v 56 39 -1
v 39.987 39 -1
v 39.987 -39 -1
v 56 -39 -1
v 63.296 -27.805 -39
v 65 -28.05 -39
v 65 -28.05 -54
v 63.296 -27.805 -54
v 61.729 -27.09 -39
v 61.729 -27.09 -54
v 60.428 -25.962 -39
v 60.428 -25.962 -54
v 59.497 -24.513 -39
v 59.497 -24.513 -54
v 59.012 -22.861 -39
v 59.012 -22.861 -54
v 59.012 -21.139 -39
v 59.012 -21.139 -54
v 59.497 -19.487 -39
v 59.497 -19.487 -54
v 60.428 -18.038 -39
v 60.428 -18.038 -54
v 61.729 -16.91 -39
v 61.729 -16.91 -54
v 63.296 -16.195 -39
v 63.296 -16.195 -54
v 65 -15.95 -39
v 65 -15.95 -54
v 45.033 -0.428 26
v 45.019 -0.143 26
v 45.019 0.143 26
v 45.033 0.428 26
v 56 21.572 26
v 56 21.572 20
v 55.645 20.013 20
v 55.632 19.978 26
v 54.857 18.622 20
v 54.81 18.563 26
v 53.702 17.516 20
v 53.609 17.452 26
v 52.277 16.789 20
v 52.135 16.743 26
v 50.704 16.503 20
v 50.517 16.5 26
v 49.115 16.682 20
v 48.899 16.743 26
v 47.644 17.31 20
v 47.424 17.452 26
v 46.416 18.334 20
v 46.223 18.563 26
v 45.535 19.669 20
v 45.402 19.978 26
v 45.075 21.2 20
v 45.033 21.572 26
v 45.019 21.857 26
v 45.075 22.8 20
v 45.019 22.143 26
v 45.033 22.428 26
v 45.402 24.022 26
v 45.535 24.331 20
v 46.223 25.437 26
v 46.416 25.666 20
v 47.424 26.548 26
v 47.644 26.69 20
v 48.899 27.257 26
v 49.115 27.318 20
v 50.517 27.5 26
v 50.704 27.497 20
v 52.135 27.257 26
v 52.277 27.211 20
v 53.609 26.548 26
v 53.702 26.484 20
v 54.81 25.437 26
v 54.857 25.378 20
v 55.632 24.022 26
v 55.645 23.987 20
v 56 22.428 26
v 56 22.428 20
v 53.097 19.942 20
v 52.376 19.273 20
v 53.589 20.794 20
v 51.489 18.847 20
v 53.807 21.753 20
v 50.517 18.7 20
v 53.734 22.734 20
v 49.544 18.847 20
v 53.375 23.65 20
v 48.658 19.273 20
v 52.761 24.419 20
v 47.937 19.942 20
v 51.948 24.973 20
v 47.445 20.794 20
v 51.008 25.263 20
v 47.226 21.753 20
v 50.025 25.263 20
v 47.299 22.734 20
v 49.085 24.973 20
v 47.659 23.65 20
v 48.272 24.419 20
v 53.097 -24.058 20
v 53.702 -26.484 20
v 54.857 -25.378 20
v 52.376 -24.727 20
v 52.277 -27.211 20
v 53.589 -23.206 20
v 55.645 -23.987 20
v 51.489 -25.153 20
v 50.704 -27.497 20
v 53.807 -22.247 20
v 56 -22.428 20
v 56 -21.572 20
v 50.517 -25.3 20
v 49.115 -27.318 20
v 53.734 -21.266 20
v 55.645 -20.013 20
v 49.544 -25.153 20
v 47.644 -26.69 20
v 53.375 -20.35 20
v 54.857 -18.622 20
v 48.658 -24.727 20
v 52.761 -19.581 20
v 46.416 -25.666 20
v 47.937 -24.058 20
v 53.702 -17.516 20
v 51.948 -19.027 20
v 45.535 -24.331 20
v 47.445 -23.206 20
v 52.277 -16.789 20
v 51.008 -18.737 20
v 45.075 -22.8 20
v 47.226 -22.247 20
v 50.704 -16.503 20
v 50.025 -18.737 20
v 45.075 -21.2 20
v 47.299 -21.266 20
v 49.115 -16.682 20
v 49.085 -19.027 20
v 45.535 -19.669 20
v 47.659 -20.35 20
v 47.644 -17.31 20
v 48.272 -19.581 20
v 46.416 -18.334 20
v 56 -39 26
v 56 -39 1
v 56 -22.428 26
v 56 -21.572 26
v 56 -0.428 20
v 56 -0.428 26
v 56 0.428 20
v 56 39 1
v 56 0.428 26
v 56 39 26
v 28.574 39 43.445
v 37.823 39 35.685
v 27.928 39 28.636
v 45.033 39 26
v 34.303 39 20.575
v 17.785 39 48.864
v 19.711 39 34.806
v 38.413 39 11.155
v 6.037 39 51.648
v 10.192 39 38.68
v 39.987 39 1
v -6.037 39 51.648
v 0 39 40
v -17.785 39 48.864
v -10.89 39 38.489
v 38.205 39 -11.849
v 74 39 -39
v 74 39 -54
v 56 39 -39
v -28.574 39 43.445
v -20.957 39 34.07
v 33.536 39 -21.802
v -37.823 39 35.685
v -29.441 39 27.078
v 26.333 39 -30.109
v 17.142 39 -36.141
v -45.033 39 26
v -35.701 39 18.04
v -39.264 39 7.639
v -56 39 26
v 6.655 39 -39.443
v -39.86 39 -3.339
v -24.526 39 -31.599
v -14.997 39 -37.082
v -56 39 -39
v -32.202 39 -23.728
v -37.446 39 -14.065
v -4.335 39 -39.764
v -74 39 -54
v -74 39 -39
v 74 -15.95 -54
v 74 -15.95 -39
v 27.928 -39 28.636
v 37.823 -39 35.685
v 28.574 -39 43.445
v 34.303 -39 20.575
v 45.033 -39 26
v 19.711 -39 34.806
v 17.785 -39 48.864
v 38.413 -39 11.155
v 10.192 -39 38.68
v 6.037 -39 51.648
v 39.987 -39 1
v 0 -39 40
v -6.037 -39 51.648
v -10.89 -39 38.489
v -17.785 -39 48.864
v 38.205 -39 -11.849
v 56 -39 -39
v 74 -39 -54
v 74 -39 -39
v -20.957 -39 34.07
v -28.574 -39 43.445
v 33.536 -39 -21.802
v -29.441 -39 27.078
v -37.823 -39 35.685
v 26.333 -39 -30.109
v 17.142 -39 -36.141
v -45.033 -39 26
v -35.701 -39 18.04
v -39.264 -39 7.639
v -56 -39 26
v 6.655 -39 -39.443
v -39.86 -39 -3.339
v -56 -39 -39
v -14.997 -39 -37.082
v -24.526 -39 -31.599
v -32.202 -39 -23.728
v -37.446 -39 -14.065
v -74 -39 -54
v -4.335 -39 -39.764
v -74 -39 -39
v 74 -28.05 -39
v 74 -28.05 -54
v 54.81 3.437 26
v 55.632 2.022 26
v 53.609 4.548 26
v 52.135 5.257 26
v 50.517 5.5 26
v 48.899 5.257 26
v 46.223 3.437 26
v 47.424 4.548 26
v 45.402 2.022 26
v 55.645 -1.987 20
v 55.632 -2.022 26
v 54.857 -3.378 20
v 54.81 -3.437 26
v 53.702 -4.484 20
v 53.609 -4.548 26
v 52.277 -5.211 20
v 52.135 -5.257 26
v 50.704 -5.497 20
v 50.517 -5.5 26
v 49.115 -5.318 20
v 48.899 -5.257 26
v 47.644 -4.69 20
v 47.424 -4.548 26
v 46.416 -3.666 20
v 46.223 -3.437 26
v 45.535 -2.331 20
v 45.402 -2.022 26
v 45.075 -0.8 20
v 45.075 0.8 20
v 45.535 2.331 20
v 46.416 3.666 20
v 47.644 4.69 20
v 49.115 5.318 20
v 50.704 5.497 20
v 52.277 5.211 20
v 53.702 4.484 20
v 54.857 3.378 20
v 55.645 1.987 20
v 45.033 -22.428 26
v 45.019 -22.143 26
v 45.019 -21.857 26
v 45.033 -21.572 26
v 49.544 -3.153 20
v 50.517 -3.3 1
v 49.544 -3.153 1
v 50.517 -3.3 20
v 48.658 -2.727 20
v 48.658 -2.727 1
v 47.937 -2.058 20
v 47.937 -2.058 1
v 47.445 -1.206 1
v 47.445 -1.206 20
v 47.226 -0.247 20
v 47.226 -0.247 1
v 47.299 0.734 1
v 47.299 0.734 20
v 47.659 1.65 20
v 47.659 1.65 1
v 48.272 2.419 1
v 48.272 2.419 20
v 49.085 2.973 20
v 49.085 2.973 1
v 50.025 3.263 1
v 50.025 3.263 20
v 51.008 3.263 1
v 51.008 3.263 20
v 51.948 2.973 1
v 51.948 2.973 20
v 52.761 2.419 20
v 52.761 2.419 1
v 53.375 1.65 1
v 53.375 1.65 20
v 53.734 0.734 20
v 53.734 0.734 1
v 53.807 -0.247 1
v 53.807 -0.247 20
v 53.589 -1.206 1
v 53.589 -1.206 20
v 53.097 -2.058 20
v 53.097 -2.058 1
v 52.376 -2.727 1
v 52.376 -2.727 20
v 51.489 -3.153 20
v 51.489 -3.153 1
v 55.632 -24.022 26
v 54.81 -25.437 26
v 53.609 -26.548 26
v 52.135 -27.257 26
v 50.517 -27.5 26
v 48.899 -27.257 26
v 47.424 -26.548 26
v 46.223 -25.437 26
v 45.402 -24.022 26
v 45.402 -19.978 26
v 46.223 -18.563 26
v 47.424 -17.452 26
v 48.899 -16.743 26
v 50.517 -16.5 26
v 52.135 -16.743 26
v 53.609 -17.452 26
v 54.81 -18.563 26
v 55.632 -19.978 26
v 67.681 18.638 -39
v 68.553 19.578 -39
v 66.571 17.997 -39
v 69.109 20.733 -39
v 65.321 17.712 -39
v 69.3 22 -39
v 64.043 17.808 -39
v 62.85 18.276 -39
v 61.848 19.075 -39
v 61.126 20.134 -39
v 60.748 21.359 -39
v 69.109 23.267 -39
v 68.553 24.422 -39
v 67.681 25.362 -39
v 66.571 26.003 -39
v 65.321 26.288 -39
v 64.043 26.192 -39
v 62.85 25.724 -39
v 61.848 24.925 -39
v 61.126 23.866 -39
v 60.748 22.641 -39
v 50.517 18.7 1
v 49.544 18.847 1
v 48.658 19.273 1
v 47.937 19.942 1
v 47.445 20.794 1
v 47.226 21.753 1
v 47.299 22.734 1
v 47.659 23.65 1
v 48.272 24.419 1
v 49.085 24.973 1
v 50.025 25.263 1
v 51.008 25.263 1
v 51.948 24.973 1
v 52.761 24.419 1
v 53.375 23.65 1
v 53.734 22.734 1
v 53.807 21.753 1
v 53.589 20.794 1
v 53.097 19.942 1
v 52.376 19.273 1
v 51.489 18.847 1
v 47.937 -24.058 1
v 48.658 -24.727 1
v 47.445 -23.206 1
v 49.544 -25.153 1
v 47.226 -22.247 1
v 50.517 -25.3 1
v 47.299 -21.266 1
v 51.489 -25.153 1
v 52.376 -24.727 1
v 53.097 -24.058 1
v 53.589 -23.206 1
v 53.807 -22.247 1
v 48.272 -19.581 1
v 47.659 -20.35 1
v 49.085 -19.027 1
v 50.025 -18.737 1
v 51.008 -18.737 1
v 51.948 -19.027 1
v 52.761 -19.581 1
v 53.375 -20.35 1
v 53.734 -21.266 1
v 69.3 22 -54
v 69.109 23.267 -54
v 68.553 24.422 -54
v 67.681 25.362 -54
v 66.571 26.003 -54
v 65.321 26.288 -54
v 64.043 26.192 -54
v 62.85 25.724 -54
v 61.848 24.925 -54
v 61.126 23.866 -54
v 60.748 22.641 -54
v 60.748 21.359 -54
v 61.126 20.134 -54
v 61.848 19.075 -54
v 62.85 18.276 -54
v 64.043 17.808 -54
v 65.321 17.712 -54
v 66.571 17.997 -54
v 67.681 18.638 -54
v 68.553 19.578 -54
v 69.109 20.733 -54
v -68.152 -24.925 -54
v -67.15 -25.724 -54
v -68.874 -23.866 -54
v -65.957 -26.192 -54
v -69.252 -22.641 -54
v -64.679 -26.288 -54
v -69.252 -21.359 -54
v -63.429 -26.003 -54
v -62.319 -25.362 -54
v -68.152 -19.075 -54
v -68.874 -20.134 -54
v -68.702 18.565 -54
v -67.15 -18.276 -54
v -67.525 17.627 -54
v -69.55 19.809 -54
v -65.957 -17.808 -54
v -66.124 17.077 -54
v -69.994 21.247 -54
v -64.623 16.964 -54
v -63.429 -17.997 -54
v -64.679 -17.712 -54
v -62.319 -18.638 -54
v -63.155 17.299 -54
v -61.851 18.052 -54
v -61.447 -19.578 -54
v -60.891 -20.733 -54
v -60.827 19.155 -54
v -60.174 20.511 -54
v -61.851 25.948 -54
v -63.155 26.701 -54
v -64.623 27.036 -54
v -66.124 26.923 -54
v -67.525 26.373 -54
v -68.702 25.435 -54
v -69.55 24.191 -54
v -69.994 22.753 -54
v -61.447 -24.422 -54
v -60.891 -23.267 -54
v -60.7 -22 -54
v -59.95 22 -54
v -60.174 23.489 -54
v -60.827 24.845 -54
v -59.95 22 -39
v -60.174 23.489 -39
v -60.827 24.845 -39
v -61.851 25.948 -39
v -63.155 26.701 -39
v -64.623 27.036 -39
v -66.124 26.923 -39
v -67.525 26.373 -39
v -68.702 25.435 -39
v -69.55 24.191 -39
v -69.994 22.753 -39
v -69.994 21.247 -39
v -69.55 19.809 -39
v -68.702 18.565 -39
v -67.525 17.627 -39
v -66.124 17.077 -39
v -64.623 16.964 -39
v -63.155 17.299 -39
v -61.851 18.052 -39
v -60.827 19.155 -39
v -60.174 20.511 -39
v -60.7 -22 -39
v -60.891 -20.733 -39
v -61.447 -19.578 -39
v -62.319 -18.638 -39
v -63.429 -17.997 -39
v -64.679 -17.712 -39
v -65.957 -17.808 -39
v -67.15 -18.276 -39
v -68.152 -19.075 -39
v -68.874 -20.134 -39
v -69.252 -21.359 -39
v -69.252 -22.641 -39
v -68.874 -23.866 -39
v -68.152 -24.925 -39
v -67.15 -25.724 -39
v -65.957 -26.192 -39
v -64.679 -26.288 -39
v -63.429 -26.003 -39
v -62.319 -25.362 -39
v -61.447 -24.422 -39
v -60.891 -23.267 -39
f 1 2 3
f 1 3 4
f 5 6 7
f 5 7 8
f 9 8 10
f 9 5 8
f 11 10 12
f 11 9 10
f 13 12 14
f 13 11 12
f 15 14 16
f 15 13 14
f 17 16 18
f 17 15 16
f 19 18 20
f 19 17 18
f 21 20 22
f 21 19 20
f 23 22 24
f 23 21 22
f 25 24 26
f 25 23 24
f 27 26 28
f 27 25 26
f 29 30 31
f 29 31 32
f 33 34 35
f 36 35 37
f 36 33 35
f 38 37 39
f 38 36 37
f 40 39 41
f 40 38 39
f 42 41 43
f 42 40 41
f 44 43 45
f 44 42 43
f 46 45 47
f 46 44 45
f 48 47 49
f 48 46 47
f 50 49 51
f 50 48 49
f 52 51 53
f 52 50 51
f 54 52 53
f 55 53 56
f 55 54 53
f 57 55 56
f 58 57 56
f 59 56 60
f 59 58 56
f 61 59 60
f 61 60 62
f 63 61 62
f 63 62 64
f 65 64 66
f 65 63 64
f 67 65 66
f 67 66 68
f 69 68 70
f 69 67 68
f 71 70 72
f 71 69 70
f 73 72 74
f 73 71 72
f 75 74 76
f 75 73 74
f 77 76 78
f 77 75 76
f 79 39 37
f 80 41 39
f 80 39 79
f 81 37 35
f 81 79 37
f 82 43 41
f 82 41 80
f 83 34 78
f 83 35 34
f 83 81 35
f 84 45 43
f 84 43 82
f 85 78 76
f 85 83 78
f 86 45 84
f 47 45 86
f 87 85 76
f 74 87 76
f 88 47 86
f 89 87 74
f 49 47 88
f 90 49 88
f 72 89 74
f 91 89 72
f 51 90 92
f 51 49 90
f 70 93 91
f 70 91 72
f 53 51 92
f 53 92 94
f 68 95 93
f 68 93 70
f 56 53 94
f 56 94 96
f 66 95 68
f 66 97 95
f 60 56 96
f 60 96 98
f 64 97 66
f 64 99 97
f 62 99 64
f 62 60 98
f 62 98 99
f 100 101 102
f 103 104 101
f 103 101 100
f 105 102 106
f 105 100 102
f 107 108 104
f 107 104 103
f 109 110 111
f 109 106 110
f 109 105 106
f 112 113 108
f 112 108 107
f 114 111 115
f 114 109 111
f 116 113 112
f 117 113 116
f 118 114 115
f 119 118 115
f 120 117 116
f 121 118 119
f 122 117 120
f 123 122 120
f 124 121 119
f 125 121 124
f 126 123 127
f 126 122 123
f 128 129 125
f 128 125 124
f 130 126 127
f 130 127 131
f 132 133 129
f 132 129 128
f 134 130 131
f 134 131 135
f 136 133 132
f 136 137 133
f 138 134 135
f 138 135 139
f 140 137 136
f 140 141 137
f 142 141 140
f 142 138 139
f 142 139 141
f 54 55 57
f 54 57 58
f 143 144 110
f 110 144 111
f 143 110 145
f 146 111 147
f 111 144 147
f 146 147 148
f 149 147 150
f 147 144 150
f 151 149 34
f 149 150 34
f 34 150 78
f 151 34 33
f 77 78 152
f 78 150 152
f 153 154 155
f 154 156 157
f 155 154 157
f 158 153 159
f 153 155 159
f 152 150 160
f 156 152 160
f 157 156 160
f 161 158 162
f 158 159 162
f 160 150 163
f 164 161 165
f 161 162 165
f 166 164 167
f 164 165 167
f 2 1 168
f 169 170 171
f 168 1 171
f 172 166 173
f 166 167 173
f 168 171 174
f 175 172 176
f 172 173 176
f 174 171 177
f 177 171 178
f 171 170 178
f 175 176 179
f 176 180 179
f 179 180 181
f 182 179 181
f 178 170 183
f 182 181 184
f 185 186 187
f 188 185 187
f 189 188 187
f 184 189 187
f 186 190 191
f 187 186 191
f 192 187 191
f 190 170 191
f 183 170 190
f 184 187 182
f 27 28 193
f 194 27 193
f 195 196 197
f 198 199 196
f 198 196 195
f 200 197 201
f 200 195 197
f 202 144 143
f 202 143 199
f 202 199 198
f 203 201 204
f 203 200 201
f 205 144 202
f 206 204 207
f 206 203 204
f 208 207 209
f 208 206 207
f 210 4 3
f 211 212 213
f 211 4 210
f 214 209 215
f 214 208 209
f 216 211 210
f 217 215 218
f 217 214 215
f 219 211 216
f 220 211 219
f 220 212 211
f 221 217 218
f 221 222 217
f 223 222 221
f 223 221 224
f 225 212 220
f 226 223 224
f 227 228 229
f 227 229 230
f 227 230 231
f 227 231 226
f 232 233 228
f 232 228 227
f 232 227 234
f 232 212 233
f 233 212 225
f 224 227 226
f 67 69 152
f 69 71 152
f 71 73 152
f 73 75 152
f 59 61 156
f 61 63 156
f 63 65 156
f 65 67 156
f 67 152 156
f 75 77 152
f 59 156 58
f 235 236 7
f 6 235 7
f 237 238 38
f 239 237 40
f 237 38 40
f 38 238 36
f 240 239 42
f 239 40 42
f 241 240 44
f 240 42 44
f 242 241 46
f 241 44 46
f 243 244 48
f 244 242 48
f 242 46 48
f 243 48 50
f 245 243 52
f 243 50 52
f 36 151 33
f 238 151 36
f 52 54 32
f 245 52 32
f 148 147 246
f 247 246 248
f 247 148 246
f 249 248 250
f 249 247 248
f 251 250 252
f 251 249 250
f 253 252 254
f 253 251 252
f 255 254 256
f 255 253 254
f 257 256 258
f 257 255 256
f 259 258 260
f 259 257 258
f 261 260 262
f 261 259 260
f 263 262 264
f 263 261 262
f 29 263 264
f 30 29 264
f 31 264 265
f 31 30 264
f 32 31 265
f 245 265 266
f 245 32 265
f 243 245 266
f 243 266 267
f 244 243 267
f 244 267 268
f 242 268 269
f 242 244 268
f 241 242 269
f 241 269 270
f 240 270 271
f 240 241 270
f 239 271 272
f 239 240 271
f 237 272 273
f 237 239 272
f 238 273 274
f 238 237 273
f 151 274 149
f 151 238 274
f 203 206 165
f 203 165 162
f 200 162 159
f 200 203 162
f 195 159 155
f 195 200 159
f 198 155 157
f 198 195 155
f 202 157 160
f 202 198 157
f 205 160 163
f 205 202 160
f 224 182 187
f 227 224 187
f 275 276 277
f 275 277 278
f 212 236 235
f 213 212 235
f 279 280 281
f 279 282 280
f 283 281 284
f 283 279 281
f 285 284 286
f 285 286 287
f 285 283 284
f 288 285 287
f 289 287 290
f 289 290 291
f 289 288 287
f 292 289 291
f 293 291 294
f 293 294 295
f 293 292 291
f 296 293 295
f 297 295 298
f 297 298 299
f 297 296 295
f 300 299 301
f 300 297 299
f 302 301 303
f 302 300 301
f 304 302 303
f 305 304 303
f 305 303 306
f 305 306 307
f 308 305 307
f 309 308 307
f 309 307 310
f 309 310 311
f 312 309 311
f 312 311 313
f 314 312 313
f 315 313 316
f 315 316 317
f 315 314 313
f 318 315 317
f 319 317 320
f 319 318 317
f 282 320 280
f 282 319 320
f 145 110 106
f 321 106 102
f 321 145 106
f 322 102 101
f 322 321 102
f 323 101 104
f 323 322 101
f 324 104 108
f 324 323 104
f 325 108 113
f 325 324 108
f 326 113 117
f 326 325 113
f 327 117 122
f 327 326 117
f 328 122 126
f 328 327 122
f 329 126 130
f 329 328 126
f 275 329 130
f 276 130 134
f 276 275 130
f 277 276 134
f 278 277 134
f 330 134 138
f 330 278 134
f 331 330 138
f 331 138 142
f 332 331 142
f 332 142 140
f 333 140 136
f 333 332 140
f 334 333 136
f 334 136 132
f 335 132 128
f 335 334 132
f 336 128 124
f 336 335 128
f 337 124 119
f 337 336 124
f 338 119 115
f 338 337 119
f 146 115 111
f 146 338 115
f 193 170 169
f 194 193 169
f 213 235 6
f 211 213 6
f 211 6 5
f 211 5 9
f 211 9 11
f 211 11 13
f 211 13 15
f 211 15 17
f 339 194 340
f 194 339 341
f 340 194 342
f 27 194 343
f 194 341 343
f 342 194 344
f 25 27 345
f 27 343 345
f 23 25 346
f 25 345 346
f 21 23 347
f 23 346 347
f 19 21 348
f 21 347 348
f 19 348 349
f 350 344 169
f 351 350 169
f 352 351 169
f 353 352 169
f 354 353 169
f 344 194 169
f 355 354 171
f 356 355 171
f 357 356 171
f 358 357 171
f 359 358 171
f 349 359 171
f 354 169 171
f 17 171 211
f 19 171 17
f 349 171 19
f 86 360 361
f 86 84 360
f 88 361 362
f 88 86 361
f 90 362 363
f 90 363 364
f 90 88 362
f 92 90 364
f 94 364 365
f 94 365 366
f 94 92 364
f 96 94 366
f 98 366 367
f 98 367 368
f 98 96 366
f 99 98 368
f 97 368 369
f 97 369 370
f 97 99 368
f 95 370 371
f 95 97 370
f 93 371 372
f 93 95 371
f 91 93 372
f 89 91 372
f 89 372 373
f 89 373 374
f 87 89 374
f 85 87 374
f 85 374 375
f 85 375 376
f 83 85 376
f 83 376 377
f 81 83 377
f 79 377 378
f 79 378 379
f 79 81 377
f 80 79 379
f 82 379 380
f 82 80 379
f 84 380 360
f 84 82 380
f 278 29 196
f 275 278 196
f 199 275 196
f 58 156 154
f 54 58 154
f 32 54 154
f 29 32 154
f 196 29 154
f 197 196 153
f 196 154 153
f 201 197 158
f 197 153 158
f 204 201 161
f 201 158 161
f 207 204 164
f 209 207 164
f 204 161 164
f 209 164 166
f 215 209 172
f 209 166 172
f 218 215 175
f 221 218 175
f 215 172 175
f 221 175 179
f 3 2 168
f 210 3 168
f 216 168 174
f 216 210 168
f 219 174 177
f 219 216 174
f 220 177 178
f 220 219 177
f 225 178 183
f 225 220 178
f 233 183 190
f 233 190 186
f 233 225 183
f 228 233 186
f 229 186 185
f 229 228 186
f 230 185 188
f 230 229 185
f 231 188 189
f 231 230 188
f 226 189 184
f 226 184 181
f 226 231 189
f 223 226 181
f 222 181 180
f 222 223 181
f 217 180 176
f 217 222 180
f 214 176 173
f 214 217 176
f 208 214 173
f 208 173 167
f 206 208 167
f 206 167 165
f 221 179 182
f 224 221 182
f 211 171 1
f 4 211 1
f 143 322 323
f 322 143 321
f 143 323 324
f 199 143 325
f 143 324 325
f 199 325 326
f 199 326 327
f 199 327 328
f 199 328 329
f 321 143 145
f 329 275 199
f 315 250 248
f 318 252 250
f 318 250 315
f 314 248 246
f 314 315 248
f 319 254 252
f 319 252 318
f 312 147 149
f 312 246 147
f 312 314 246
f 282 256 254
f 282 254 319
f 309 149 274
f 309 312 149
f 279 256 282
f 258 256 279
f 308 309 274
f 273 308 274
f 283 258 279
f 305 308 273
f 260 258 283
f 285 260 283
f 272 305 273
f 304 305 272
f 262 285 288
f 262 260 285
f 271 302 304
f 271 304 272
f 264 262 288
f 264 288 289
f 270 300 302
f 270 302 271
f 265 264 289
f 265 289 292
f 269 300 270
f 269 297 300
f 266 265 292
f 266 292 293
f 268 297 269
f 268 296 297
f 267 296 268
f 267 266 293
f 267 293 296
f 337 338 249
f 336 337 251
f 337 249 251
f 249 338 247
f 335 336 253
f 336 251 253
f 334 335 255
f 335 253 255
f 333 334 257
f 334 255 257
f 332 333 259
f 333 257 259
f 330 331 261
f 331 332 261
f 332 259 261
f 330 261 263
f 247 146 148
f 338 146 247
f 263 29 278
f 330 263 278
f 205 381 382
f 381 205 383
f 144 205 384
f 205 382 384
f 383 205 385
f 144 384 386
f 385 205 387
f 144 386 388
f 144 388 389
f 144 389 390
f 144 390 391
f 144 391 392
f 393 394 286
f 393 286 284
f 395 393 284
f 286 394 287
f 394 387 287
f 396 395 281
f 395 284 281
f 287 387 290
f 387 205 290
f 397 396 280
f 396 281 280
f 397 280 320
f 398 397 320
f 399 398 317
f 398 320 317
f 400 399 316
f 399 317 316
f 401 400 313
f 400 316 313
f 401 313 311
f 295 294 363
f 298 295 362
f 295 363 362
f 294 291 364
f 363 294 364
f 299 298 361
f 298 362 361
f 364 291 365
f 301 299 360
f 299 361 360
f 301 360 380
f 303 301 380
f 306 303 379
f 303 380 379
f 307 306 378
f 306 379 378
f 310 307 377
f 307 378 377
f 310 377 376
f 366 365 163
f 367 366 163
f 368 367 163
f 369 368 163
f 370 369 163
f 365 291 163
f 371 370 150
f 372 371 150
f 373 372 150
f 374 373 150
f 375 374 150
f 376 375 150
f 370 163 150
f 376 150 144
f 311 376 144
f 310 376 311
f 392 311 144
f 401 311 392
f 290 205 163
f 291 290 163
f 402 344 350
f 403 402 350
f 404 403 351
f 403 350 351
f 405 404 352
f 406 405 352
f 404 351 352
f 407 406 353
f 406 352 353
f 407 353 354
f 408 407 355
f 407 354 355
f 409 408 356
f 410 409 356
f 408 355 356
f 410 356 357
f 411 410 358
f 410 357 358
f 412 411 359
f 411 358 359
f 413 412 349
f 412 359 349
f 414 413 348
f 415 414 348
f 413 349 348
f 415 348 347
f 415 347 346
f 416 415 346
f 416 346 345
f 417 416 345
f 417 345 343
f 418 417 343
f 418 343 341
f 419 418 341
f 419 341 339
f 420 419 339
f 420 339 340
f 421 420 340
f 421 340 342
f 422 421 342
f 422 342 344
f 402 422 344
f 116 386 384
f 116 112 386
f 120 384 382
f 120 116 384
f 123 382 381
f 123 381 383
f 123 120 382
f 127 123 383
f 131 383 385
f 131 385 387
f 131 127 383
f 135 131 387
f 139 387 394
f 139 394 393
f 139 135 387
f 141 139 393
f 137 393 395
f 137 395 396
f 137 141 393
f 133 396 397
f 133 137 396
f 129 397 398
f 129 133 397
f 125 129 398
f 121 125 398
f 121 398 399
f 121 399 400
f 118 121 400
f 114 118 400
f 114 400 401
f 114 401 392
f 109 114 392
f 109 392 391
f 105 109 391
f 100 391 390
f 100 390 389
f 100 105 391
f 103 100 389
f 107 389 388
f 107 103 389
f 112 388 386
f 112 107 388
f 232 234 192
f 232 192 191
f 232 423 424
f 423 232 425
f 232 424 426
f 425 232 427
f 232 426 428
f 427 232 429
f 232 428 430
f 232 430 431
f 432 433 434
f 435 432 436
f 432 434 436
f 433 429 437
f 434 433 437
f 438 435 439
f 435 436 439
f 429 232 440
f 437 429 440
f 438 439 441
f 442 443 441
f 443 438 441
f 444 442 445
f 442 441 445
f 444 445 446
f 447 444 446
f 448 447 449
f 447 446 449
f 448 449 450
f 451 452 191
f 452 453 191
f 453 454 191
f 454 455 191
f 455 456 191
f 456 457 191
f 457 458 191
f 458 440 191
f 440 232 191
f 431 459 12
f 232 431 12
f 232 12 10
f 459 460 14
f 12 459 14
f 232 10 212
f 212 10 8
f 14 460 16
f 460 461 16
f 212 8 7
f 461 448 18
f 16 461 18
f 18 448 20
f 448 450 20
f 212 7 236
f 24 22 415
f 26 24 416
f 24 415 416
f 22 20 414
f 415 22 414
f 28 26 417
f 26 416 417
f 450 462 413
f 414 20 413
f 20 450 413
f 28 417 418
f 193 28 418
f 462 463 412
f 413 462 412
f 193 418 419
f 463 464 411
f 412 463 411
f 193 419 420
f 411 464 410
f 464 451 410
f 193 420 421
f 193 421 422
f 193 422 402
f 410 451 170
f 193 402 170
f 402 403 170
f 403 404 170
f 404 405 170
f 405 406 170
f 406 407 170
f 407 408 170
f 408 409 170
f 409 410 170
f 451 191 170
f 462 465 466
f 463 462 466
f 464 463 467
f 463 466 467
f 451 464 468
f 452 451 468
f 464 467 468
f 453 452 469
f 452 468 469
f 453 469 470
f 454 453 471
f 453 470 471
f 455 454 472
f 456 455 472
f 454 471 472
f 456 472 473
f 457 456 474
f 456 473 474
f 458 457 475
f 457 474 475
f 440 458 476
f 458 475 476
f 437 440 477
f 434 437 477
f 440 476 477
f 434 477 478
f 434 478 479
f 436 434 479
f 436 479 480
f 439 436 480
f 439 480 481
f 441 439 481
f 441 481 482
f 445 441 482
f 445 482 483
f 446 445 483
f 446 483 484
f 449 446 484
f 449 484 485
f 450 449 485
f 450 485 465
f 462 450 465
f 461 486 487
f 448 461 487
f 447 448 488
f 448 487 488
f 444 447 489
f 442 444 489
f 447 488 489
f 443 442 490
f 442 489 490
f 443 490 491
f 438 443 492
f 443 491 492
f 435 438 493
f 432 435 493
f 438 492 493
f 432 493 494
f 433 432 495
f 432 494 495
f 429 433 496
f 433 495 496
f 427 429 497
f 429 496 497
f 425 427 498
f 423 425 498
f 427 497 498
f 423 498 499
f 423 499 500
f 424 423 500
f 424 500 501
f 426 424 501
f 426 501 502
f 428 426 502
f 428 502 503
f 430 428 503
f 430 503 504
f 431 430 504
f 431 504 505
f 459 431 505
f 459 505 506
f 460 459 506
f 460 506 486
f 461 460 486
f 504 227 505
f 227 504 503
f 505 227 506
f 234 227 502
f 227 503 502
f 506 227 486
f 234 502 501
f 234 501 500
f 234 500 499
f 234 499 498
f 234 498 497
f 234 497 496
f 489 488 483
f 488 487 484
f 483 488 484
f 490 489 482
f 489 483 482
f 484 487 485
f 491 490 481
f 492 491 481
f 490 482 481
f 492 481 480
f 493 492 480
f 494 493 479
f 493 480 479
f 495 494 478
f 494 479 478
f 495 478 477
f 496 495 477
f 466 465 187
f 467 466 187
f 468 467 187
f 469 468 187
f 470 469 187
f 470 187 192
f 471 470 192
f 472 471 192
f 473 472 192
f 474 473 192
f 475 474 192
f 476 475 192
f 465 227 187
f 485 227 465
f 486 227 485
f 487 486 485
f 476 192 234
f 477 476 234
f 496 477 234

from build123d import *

# Parameters (mm, degrees)
SKETCH1_R                      = 40
BOSS_EXTRUDE1_DEPTH            = 39
CUT_EXTRUDE1_REACH             = 101.564
SKETCH2_W                      = 56
SKETCH2_H                      = 2
CUT_EXTRUDE1_DIRECTION_2_REACH = 101.564
CBORE_FOR_M6_SHCS1_AT_2_COUNT  = 2
CBORE_FOR_M6_SHCS1_AT_2_PITCH  = 22
CBORE_FOR_M6_SHCS1_AT_3_COUNT  = 2
CBORE_FOR_M6_SHCS1_AT_3_PITCH  = 44
CUT_EXTRUDE2_REACH             = 125.604
SKETCH5_R                      = 4.3
SKETCH5_R_2                    = 5.05


with BuildPart() as part:
    # Sketch1 → Boss-Extrude1 (new, symmetric)
    with BuildSketch(Plane(origin=(0, 0, 0), x_dir=(1, 0, 0), z_dir=(0, 1, 0))):
        with BuildLine():
            Line((-74, 54), (74, 54))
            Line((74, 54), (74, 39))
            Line((74, 39), (56, 39))
            Line((56, 39), (56, -26))
            Line((56, -26), (45.033320997, -26))
            ThreePointArc((45.033320997, -26), (0, -52), (-45.033320997, -26))
            Line((-45.033320997, -26), (-56, -26))
            Line((-56, -26), (-56, 39))
            Line((-56, 39), (-74, 39))
            Line((-74, 39), (-74, 54))
        make_face()
        with Locations(Location((0, 0, 0), (0, 0, 270))):
            Circle(SKETCH1_R, mode=Mode.SUBTRACT)
    extrude(amount=BOSS_EXTRUDE1_DEPTH, both=True)

    # Sketch2 → Cut-Extrude1 (cut, up to next)
    with BuildSketch(Plane(origin=(0, 0, 0), x_dir=(1, 0, 0), z_dir=(0, 1, 0)), mode=Mode.PRIVATE) as cut_extrude1_sk1:
        with Locations((28, 0)):
            Rectangle(SKETCH2_W, SKETCH2_H)
    cut_extrude1_tool1 = extrude(cut_extrude1_sk1.sketch, amount=-CUT_EXTRUDE1_REACH, mode=Mode.PRIVATE) & part.part
    add(cut_extrude1_tool1.solids().sort_by_distance((28, 0, 0))[0], mode=Mode.SUBTRACT)

    # Sketch2 → Cut-Extrude1 direction 2 (cut, up to next)
    with BuildSketch(Plane(origin=(0, 0, 0), x_dir=(1, 0, 0), z_dir=(0, 1, 0)), mode=Mode.PRIVATE) as cut_extrude1_direction_2_sk1:
        with Locations((28, 0)):
            Rectangle(SKETCH2_W, SKETCH2_H)
    cut_extrude1_direction_2_tool1 = extrude(cut_extrude1_direction_2_sk1.sketch, amount=CUT_EXTRUDE1_DIRECTION_2_REACH, mode=Mode.PRIVATE) & part.part
    add(cut_extrude1_direction_2_tool1.solids().sort_by_distance((28, 0, 0))[0], mode=Mode.SUBTRACT)

    # Sketch4 → CBORE for M6 SHCS1 (revolve, cut)
    with BuildSketch(Plane(origin=(50.516660498, 22, 26), x_dir=(0, -1, 0), z_dir=(1, 0, 0))):
        Polygon((0, 0), (0, 25), (3.3, 25), (3.3, 6), (5.5, 6), (5.5, 0), align=None)
    cbore_for_m6_shcs1 = revolve(axis=Axis((50.516660498, 22, 32.35), (0, 0, -1)), mode=Mode.SUBTRACT)

    # CBORE for M6 SHCS1 at 2: CBORE for M6 SHCS1 ×2
    with Locations(*[(0, -i * CBORE_FOR_M6_SHCS1_AT_2_PITCH, 0) for i in range(1, CBORE_FOR_M6_SHCS1_AT_2_COUNT)]):
        add(cbore_for_m6_shcs1, mode=Mode.SUBTRACT)

    # CBORE for M6 SHCS1 at 3: CBORE for M6 SHCS1 ×2
    with Locations(*[(0, -i * CBORE_FOR_M6_SHCS1_AT_3_PITCH, 0) for i in range(1, CBORE_FOR_M6_SHCS1_AT_3_COUNT)]):
        add(cbore_for_m6_shcs1, mode=Mode.SUBTRACT)

    # Sketch5 → Cut-Extrude2 (cut, up to next)
    with BuildSketch(Plane.XY.offset(-39), mode=Mode.PRIVATE) as cut_extrude2_sk1:
        with Locations((65, 22)):
            Circle(SKETCH5_R)
    cut_extrude2_tool1 = extrude(cut_extrude2_sk1.sketch, amount=-CUT_EXTRUDE2_REACH, mode=Mode.PRIVATE) & part.part
    # Sketch5 → Cut-Extrude2 (cut, up to next)
    with BuildSketch(Plane.XY.offset(-39), mode=Mode.PRIVATE) as cut_extrude2_sk2:
        with Locations((-65, -22)):
            Circle(SKETCH5_R)
    cut_extrude2_tool2 = extrude(cut_extrude2_sk2.sketch, amount=-CUT_EXTRUDE2_REACH, mode=Mode.PRIVATE) & part.part
    # Sketch5 → Cut-Extrude2 (cut, up to next)
    with BuildSketch(Plane.XY.offset(-39), mode=Mode.PRIVATE) as cut_extrude2_sk3:
        with Locations((-65, 22)):
            Circle(SKETCH5_R_2)
    cut_extrude2_tool3 = extrude(cut_extrude2_sk3.sketch, amount=-CUT_EXTRUDE2_REACH, mode=Mode.PRIVATE) & part.part
    # Sketch5 → Cut-Extrude2 (cut, up to next)
    with BuildSketch(Plane.XY.offset(-39), mode=Mode.PRIVATE) as cut_extrude2_sk4:
        with BuildLine():
            Line((65, -15.95), (74, -15.95))
            Line((74, -15.95), (74, -28.05))
            Line((74, -28.05), (65, -28.05))
            ThreePointArc((65, -28.05), (58.95, -22), (65, -15.95))
        make_face()
    cut_extrude2_tool4 = extrude(cut_extrude2_sk4.sketch, amount=-CUT_EXTRUDE2_REACH, mode=Mode.PRIVATE) & part.part
    add(cut_extrude2_tool1.solids().sort_by_distance((65, 22, -39))[0], mode=Mode.SUBTRACT)
    add(cut_extrude2_tool2.solids().sort_by_distance((-65, -22, -39))[0], mode=Mode.SUBTRACT)
    add(cut_extrude2_tool3.solids().sort_by_distance((-65, 22, -39))[0], mode=Mode.SUBTRACT)
    add(cut_extrude2_tool4.solids().sort_by_distance((67.057873, -22, -39))[0], mode=Mode.SUBTRACT)


solid = part.part
